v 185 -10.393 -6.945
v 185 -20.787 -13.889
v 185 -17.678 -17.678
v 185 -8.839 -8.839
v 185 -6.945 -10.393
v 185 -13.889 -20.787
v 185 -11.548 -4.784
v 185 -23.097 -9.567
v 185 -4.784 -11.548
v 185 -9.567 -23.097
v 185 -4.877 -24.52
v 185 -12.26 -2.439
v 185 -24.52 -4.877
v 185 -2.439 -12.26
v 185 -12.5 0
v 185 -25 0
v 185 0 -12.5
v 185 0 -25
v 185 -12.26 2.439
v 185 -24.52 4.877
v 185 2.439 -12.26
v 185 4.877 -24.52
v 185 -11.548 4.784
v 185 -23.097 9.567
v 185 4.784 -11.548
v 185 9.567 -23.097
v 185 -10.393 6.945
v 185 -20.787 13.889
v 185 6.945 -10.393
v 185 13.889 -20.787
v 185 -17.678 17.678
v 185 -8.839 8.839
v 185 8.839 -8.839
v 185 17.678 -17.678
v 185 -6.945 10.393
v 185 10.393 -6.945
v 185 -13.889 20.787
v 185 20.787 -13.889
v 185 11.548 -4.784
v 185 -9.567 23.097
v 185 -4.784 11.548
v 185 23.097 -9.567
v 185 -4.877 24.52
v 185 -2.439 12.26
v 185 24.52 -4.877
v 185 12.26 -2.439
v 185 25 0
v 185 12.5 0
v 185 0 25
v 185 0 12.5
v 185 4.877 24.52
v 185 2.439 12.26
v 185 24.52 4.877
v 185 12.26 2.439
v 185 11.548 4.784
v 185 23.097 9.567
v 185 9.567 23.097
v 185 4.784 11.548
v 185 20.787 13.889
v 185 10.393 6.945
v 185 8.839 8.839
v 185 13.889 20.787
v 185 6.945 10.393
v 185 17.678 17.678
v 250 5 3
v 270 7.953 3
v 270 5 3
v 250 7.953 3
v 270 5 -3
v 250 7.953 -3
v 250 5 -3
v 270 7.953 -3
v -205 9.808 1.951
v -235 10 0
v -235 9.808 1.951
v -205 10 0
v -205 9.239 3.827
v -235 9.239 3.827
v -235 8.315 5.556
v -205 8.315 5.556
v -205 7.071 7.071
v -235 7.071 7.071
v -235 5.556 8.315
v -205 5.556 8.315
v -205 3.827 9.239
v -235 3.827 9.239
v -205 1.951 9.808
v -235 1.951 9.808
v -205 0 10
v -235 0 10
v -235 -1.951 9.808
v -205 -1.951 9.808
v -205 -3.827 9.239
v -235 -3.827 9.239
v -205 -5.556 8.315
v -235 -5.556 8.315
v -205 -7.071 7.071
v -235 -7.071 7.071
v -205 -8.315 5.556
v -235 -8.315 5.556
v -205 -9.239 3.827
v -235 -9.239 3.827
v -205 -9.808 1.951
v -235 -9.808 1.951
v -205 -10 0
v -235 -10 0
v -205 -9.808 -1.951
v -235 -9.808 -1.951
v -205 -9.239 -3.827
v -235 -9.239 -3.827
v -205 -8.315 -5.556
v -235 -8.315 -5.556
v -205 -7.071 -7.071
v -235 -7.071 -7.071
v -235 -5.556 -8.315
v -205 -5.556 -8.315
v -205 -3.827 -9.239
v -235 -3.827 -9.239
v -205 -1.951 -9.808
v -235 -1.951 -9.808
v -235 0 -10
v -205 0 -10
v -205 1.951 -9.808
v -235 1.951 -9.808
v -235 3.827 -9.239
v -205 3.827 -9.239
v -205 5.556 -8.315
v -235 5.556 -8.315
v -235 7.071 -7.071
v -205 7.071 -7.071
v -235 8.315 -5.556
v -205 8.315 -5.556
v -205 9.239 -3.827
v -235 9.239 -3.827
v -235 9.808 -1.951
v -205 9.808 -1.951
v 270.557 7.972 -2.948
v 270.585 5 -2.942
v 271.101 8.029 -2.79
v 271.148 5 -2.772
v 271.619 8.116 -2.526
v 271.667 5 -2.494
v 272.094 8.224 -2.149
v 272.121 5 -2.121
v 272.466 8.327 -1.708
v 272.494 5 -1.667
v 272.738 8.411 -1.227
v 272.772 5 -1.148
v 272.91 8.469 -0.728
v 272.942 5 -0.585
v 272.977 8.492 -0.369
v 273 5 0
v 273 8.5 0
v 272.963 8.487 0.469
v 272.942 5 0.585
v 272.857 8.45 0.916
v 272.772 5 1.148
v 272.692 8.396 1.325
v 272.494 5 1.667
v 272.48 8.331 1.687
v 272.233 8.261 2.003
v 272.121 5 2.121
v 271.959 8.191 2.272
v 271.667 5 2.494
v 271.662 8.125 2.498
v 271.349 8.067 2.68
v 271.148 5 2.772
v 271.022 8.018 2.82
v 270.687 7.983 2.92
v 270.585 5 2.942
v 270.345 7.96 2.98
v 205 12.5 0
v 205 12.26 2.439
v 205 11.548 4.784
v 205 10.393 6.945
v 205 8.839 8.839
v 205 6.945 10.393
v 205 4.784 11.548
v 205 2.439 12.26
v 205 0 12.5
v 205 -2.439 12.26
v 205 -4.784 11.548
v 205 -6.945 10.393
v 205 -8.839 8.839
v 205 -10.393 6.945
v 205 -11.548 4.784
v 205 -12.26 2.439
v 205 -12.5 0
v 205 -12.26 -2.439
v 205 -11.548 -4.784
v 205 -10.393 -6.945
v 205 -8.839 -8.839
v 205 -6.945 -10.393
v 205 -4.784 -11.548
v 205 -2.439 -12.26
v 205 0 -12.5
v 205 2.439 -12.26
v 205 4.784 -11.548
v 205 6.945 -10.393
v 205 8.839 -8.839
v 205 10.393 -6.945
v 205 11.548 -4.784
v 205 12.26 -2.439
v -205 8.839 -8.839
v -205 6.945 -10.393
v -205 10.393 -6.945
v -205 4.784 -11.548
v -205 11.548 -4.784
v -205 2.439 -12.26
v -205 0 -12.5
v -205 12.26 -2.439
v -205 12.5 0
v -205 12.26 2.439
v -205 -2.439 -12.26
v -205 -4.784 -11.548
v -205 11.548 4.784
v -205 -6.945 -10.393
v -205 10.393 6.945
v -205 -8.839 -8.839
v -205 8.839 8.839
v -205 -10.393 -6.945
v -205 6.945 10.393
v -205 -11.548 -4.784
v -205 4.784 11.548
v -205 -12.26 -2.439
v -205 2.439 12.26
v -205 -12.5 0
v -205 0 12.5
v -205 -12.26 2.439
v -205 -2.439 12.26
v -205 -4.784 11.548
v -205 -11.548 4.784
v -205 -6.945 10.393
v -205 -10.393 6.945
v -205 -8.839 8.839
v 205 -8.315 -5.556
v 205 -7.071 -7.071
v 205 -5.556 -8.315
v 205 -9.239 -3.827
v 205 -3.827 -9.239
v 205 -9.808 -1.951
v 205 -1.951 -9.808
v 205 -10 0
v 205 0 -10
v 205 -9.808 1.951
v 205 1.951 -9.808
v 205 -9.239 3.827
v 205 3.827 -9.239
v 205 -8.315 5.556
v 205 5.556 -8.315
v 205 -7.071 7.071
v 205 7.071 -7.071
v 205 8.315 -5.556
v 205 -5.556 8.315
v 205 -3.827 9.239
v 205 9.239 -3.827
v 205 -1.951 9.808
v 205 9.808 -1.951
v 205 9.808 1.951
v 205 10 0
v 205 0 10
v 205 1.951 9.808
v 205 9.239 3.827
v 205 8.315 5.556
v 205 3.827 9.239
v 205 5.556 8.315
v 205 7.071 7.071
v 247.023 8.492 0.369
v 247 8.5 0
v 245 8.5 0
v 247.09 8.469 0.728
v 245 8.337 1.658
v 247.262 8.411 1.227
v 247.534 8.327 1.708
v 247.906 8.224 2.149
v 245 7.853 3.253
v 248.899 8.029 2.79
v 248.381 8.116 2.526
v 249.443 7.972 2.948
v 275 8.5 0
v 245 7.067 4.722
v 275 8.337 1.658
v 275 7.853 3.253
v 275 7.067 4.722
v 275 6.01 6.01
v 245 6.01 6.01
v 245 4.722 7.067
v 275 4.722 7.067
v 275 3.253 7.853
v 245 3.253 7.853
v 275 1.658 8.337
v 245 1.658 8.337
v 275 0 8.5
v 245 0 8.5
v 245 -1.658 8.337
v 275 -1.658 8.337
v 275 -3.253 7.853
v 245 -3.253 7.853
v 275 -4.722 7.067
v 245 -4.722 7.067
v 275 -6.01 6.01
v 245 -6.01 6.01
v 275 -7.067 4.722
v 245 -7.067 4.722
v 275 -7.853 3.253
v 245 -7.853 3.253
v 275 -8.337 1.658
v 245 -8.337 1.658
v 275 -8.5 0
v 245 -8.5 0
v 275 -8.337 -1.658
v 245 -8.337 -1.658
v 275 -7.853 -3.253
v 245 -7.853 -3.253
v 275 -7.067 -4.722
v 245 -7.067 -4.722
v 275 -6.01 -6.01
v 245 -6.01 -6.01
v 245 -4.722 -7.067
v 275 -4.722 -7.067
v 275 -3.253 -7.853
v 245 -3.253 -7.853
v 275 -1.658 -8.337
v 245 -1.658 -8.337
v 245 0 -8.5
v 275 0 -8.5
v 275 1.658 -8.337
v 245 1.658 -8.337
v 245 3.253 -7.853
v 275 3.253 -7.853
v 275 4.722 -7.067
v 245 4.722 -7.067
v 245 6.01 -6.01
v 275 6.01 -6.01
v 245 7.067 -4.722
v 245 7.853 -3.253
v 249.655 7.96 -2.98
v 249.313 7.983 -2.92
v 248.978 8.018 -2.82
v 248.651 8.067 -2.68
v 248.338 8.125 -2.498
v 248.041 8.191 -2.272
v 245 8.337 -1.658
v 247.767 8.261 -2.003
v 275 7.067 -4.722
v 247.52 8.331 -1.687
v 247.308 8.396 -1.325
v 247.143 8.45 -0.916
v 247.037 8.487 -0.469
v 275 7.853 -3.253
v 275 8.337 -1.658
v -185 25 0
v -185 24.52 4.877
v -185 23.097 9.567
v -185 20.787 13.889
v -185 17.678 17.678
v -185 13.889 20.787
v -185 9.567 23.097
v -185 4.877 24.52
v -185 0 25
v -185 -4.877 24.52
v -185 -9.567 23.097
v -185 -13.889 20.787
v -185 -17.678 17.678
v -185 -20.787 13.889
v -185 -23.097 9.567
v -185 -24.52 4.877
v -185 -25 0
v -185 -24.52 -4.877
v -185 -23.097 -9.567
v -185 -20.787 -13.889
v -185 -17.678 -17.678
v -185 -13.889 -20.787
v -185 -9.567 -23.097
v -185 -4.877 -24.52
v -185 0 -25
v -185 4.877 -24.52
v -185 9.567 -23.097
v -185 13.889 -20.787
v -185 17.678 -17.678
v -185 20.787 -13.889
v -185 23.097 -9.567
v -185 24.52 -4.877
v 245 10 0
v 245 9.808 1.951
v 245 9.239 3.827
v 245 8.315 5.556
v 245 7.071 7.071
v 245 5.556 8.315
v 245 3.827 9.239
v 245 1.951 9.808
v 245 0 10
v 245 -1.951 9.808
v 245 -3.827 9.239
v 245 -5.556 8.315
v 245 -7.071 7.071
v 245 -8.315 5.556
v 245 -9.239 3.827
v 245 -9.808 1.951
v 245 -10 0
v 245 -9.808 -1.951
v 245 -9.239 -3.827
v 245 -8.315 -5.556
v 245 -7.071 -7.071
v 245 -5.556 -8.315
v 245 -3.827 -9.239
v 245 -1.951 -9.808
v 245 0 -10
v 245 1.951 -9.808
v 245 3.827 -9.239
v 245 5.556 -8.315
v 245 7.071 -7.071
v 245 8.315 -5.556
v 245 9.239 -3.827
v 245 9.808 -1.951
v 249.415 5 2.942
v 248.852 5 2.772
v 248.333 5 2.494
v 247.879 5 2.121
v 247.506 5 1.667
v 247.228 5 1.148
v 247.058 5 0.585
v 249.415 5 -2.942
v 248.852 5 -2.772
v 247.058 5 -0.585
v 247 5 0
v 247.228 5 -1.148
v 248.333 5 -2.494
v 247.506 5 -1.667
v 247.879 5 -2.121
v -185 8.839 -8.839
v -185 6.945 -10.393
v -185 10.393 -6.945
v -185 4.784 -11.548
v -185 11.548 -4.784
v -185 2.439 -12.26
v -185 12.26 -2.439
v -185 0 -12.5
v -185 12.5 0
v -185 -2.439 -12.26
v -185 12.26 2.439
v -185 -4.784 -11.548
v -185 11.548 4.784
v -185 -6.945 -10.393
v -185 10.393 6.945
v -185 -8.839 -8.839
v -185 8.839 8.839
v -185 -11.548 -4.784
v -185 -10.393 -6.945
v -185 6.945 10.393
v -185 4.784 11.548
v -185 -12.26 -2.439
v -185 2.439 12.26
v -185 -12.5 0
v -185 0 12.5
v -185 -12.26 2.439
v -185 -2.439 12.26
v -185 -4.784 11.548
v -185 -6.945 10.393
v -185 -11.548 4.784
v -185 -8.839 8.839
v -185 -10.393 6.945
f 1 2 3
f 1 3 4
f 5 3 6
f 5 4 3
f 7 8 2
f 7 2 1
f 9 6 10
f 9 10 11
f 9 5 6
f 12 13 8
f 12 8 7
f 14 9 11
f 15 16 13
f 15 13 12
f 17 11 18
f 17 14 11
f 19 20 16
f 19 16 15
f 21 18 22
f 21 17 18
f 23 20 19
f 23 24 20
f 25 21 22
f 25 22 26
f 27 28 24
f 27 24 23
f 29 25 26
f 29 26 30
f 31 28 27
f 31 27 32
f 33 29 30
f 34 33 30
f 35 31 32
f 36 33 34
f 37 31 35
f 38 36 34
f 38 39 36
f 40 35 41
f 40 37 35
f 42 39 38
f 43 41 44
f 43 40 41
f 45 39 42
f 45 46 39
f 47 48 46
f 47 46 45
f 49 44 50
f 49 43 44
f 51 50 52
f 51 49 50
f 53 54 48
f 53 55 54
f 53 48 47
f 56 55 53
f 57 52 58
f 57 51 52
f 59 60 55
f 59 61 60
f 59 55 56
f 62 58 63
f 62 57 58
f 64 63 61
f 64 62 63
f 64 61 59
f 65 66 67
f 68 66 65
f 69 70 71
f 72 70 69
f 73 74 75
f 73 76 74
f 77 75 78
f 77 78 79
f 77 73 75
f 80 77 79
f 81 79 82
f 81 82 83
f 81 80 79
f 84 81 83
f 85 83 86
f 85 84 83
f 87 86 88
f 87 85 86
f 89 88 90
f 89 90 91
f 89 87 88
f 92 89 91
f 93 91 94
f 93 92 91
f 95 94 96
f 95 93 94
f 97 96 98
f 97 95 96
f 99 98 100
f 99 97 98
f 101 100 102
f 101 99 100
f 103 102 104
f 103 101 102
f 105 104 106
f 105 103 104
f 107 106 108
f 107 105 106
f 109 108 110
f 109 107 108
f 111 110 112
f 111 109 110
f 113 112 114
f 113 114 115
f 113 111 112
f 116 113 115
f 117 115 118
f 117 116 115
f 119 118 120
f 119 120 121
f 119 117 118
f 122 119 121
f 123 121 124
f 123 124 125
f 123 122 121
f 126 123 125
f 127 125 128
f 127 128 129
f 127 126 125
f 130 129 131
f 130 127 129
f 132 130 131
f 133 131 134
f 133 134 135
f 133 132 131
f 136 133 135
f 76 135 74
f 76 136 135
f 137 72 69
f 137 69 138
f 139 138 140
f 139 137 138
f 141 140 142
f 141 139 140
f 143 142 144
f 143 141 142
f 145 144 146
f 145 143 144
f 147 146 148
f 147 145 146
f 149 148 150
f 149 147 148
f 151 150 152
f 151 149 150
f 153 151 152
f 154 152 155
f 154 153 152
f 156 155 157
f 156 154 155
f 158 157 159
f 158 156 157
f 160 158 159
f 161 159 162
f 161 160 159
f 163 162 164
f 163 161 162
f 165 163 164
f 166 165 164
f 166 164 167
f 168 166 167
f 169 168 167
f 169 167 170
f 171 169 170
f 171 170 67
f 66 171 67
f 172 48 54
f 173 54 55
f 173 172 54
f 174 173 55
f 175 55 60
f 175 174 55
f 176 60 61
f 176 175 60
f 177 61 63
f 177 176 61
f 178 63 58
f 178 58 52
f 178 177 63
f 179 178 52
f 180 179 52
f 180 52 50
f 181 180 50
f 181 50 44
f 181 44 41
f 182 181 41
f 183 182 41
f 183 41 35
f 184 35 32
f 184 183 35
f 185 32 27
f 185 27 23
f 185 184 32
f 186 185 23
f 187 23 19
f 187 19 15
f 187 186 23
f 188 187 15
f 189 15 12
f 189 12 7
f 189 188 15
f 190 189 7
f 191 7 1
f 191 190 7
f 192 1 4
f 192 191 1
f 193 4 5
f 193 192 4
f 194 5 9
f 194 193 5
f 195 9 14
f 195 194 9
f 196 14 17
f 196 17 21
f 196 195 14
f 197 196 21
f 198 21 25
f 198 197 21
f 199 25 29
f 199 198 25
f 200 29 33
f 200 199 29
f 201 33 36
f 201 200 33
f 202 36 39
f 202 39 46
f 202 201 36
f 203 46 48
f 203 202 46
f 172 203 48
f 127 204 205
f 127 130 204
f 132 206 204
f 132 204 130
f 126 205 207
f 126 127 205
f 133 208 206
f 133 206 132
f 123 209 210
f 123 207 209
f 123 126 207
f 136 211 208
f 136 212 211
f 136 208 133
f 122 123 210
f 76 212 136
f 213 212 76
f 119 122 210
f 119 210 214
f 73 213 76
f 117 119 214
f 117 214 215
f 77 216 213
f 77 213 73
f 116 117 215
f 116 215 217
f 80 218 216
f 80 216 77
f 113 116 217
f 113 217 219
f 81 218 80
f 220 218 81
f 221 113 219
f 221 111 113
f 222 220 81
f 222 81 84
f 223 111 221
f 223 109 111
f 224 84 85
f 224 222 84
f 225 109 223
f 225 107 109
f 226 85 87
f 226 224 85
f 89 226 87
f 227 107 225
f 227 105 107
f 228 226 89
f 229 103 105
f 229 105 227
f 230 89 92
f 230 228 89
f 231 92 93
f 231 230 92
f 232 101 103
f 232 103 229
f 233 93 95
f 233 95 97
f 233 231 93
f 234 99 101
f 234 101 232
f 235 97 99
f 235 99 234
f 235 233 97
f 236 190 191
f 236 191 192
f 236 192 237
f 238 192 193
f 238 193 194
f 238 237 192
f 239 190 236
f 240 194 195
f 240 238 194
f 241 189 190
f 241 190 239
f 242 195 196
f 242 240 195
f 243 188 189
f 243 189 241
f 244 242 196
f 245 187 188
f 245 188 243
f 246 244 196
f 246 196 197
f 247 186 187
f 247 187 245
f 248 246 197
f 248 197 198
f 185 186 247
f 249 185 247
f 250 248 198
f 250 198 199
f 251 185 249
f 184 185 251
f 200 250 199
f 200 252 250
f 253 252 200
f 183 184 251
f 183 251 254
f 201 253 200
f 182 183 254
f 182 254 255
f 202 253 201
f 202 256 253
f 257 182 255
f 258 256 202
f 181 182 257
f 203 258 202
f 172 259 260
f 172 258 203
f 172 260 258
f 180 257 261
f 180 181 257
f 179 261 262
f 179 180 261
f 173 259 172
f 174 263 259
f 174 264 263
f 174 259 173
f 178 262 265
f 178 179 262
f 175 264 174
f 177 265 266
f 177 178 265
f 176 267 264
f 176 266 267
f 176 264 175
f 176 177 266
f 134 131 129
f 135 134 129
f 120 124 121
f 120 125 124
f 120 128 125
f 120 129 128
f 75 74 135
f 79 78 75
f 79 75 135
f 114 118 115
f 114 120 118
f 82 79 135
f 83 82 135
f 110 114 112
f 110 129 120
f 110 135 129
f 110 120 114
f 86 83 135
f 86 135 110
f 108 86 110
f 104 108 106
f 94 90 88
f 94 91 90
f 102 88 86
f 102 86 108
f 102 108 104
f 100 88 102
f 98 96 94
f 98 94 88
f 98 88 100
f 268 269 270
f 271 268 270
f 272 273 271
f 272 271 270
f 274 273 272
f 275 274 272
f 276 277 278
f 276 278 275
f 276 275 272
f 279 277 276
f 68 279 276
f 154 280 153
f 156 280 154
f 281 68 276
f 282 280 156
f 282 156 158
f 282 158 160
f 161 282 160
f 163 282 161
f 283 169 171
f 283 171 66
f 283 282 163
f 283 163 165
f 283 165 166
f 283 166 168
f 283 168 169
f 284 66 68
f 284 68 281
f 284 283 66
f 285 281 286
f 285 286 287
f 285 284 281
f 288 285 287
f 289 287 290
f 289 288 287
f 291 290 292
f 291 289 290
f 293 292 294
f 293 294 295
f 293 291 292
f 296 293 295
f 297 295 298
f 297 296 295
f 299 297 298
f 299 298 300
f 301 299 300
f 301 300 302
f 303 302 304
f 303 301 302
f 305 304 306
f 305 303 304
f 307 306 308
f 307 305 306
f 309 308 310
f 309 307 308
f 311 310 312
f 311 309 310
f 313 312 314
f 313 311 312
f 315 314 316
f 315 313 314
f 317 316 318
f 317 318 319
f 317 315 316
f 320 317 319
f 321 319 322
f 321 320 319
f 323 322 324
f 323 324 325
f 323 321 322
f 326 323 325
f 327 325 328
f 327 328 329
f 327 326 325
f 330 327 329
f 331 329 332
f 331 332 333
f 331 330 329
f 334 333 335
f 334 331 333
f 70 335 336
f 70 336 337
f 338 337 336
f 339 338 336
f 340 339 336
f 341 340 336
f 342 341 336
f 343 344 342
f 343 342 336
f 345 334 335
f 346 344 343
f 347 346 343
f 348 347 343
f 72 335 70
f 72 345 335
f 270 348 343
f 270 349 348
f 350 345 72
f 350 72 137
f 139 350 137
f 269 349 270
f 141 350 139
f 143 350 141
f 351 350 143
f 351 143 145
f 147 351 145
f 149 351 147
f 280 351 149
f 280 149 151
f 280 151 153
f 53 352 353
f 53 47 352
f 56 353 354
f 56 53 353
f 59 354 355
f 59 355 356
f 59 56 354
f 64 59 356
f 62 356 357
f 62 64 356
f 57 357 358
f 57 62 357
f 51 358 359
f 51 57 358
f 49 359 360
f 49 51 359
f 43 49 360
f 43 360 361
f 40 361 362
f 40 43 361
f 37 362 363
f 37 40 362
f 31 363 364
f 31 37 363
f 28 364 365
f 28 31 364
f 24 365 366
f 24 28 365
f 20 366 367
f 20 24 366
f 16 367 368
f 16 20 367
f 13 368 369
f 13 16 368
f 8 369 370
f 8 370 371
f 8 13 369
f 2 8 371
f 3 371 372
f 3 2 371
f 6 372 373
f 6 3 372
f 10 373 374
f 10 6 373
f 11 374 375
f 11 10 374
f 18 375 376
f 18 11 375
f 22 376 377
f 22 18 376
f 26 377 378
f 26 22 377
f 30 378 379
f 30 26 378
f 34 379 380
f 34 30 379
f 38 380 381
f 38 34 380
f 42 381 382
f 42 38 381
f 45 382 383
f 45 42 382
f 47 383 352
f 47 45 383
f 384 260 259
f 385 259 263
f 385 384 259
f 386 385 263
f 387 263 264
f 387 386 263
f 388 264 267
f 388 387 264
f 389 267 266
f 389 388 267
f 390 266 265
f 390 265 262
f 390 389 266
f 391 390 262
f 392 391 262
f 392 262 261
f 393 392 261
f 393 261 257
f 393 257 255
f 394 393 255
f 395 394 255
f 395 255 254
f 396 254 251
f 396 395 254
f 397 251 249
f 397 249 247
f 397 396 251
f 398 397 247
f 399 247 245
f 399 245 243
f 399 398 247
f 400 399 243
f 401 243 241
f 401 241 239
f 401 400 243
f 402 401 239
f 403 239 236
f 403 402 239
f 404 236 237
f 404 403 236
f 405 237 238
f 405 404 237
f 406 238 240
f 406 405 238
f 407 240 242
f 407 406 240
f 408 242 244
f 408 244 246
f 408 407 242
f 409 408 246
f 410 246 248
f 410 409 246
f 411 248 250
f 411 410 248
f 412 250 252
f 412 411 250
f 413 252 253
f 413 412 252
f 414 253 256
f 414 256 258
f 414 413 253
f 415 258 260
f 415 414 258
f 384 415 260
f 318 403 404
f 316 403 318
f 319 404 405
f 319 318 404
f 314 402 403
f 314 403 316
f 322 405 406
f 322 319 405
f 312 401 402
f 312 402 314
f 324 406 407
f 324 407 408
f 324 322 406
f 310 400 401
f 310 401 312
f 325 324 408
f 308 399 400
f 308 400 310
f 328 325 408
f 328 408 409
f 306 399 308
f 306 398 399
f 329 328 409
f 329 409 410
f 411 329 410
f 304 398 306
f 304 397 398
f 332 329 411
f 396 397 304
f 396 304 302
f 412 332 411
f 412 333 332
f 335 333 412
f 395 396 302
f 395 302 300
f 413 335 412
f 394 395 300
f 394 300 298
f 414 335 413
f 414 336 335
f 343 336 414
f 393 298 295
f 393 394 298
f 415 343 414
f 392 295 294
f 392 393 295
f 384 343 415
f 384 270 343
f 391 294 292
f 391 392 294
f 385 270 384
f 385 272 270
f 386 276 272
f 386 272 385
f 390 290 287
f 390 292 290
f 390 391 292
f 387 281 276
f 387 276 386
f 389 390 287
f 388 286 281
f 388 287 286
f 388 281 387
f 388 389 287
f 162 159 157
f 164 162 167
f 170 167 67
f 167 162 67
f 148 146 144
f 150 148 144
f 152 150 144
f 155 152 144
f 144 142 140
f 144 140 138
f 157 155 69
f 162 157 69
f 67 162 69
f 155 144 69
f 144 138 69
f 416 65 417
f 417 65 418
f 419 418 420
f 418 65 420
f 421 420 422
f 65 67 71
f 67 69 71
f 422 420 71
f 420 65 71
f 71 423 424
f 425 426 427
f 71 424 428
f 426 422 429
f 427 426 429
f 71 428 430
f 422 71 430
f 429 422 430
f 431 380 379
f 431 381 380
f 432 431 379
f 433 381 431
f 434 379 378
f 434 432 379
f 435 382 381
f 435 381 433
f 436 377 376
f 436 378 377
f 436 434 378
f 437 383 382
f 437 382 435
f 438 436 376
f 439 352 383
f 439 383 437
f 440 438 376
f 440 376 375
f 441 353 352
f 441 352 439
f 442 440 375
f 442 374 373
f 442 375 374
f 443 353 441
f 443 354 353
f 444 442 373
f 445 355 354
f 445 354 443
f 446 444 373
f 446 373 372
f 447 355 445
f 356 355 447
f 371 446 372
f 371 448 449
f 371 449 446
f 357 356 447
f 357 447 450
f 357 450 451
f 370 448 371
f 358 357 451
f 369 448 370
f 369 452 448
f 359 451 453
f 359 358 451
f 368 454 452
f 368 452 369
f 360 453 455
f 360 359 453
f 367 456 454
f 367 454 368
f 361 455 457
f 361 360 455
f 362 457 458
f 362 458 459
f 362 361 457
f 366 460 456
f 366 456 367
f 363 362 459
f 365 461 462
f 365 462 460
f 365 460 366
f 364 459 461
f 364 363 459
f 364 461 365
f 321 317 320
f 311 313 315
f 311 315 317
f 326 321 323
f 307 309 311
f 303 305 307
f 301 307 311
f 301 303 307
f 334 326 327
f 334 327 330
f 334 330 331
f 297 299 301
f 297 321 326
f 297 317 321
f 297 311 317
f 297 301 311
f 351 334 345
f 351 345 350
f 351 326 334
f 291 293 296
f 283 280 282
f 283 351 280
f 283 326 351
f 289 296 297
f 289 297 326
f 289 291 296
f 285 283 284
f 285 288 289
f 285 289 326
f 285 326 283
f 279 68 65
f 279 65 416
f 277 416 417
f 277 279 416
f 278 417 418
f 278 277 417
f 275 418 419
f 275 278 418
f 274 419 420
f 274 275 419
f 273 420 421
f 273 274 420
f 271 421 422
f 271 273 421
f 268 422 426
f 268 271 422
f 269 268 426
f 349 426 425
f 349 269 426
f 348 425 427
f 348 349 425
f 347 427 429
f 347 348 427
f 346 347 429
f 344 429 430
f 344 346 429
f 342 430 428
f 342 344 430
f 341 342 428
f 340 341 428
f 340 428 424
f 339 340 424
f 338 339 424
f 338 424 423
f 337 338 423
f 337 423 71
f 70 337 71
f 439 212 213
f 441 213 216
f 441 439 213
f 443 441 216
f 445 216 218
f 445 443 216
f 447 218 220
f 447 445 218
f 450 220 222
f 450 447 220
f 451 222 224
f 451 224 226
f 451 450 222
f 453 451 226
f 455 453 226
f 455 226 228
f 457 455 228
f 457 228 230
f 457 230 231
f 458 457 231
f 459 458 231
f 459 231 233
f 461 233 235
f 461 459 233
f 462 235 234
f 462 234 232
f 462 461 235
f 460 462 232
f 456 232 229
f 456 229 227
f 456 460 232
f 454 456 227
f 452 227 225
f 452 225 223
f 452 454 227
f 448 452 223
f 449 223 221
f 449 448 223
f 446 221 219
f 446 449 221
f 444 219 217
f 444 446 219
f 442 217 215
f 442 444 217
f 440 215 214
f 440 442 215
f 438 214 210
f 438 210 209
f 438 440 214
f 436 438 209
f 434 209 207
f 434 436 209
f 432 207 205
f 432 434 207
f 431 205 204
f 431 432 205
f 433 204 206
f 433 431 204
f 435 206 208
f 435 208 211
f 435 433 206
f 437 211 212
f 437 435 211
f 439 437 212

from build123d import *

# Parameters (mm, degrees)
CUT_EXTRUDE_1_DEPTH = 3.5


with BuildPart() as part:
    # 草图1 → 旋转1 (revolve)
    with BuildSketch(Plane.XY):
        Polygon((-185, 25), (185, 25), (185, 12.5), (205, 12.5), (205, 10), (245, 10), (245, 8.5), (275, 8.5), (275, 0), (235, 0), (-235, 0), (-235, 10), (-205, 10), (-205, 12.5), (-185, 12.5), align=None)
    revolve(axis=Axis((-235, 0, 0), (1, 0, 0)))

    # 草图2 → 切除-拉伸1 (cut)
    with BuildSketch(Plane(origin=(0, 8.5, 0), x_dir=(1, 0, 0), z_dir=(0, 1, 0))):
        with BuildLine():
            Line((250, 3), (270, 3))
            ThreePointArc((270, 3), (273, 0), (270, -3))
            Line((270, -3), (250, -3))
            ThreePointArc((250, -3), (247, 0), (250, 3))
        make_face()
    extrude(amount=-CUT_EXTRUDE_1_DEPTH, mode=Mode.SUBTRACT)


solid = part.part
